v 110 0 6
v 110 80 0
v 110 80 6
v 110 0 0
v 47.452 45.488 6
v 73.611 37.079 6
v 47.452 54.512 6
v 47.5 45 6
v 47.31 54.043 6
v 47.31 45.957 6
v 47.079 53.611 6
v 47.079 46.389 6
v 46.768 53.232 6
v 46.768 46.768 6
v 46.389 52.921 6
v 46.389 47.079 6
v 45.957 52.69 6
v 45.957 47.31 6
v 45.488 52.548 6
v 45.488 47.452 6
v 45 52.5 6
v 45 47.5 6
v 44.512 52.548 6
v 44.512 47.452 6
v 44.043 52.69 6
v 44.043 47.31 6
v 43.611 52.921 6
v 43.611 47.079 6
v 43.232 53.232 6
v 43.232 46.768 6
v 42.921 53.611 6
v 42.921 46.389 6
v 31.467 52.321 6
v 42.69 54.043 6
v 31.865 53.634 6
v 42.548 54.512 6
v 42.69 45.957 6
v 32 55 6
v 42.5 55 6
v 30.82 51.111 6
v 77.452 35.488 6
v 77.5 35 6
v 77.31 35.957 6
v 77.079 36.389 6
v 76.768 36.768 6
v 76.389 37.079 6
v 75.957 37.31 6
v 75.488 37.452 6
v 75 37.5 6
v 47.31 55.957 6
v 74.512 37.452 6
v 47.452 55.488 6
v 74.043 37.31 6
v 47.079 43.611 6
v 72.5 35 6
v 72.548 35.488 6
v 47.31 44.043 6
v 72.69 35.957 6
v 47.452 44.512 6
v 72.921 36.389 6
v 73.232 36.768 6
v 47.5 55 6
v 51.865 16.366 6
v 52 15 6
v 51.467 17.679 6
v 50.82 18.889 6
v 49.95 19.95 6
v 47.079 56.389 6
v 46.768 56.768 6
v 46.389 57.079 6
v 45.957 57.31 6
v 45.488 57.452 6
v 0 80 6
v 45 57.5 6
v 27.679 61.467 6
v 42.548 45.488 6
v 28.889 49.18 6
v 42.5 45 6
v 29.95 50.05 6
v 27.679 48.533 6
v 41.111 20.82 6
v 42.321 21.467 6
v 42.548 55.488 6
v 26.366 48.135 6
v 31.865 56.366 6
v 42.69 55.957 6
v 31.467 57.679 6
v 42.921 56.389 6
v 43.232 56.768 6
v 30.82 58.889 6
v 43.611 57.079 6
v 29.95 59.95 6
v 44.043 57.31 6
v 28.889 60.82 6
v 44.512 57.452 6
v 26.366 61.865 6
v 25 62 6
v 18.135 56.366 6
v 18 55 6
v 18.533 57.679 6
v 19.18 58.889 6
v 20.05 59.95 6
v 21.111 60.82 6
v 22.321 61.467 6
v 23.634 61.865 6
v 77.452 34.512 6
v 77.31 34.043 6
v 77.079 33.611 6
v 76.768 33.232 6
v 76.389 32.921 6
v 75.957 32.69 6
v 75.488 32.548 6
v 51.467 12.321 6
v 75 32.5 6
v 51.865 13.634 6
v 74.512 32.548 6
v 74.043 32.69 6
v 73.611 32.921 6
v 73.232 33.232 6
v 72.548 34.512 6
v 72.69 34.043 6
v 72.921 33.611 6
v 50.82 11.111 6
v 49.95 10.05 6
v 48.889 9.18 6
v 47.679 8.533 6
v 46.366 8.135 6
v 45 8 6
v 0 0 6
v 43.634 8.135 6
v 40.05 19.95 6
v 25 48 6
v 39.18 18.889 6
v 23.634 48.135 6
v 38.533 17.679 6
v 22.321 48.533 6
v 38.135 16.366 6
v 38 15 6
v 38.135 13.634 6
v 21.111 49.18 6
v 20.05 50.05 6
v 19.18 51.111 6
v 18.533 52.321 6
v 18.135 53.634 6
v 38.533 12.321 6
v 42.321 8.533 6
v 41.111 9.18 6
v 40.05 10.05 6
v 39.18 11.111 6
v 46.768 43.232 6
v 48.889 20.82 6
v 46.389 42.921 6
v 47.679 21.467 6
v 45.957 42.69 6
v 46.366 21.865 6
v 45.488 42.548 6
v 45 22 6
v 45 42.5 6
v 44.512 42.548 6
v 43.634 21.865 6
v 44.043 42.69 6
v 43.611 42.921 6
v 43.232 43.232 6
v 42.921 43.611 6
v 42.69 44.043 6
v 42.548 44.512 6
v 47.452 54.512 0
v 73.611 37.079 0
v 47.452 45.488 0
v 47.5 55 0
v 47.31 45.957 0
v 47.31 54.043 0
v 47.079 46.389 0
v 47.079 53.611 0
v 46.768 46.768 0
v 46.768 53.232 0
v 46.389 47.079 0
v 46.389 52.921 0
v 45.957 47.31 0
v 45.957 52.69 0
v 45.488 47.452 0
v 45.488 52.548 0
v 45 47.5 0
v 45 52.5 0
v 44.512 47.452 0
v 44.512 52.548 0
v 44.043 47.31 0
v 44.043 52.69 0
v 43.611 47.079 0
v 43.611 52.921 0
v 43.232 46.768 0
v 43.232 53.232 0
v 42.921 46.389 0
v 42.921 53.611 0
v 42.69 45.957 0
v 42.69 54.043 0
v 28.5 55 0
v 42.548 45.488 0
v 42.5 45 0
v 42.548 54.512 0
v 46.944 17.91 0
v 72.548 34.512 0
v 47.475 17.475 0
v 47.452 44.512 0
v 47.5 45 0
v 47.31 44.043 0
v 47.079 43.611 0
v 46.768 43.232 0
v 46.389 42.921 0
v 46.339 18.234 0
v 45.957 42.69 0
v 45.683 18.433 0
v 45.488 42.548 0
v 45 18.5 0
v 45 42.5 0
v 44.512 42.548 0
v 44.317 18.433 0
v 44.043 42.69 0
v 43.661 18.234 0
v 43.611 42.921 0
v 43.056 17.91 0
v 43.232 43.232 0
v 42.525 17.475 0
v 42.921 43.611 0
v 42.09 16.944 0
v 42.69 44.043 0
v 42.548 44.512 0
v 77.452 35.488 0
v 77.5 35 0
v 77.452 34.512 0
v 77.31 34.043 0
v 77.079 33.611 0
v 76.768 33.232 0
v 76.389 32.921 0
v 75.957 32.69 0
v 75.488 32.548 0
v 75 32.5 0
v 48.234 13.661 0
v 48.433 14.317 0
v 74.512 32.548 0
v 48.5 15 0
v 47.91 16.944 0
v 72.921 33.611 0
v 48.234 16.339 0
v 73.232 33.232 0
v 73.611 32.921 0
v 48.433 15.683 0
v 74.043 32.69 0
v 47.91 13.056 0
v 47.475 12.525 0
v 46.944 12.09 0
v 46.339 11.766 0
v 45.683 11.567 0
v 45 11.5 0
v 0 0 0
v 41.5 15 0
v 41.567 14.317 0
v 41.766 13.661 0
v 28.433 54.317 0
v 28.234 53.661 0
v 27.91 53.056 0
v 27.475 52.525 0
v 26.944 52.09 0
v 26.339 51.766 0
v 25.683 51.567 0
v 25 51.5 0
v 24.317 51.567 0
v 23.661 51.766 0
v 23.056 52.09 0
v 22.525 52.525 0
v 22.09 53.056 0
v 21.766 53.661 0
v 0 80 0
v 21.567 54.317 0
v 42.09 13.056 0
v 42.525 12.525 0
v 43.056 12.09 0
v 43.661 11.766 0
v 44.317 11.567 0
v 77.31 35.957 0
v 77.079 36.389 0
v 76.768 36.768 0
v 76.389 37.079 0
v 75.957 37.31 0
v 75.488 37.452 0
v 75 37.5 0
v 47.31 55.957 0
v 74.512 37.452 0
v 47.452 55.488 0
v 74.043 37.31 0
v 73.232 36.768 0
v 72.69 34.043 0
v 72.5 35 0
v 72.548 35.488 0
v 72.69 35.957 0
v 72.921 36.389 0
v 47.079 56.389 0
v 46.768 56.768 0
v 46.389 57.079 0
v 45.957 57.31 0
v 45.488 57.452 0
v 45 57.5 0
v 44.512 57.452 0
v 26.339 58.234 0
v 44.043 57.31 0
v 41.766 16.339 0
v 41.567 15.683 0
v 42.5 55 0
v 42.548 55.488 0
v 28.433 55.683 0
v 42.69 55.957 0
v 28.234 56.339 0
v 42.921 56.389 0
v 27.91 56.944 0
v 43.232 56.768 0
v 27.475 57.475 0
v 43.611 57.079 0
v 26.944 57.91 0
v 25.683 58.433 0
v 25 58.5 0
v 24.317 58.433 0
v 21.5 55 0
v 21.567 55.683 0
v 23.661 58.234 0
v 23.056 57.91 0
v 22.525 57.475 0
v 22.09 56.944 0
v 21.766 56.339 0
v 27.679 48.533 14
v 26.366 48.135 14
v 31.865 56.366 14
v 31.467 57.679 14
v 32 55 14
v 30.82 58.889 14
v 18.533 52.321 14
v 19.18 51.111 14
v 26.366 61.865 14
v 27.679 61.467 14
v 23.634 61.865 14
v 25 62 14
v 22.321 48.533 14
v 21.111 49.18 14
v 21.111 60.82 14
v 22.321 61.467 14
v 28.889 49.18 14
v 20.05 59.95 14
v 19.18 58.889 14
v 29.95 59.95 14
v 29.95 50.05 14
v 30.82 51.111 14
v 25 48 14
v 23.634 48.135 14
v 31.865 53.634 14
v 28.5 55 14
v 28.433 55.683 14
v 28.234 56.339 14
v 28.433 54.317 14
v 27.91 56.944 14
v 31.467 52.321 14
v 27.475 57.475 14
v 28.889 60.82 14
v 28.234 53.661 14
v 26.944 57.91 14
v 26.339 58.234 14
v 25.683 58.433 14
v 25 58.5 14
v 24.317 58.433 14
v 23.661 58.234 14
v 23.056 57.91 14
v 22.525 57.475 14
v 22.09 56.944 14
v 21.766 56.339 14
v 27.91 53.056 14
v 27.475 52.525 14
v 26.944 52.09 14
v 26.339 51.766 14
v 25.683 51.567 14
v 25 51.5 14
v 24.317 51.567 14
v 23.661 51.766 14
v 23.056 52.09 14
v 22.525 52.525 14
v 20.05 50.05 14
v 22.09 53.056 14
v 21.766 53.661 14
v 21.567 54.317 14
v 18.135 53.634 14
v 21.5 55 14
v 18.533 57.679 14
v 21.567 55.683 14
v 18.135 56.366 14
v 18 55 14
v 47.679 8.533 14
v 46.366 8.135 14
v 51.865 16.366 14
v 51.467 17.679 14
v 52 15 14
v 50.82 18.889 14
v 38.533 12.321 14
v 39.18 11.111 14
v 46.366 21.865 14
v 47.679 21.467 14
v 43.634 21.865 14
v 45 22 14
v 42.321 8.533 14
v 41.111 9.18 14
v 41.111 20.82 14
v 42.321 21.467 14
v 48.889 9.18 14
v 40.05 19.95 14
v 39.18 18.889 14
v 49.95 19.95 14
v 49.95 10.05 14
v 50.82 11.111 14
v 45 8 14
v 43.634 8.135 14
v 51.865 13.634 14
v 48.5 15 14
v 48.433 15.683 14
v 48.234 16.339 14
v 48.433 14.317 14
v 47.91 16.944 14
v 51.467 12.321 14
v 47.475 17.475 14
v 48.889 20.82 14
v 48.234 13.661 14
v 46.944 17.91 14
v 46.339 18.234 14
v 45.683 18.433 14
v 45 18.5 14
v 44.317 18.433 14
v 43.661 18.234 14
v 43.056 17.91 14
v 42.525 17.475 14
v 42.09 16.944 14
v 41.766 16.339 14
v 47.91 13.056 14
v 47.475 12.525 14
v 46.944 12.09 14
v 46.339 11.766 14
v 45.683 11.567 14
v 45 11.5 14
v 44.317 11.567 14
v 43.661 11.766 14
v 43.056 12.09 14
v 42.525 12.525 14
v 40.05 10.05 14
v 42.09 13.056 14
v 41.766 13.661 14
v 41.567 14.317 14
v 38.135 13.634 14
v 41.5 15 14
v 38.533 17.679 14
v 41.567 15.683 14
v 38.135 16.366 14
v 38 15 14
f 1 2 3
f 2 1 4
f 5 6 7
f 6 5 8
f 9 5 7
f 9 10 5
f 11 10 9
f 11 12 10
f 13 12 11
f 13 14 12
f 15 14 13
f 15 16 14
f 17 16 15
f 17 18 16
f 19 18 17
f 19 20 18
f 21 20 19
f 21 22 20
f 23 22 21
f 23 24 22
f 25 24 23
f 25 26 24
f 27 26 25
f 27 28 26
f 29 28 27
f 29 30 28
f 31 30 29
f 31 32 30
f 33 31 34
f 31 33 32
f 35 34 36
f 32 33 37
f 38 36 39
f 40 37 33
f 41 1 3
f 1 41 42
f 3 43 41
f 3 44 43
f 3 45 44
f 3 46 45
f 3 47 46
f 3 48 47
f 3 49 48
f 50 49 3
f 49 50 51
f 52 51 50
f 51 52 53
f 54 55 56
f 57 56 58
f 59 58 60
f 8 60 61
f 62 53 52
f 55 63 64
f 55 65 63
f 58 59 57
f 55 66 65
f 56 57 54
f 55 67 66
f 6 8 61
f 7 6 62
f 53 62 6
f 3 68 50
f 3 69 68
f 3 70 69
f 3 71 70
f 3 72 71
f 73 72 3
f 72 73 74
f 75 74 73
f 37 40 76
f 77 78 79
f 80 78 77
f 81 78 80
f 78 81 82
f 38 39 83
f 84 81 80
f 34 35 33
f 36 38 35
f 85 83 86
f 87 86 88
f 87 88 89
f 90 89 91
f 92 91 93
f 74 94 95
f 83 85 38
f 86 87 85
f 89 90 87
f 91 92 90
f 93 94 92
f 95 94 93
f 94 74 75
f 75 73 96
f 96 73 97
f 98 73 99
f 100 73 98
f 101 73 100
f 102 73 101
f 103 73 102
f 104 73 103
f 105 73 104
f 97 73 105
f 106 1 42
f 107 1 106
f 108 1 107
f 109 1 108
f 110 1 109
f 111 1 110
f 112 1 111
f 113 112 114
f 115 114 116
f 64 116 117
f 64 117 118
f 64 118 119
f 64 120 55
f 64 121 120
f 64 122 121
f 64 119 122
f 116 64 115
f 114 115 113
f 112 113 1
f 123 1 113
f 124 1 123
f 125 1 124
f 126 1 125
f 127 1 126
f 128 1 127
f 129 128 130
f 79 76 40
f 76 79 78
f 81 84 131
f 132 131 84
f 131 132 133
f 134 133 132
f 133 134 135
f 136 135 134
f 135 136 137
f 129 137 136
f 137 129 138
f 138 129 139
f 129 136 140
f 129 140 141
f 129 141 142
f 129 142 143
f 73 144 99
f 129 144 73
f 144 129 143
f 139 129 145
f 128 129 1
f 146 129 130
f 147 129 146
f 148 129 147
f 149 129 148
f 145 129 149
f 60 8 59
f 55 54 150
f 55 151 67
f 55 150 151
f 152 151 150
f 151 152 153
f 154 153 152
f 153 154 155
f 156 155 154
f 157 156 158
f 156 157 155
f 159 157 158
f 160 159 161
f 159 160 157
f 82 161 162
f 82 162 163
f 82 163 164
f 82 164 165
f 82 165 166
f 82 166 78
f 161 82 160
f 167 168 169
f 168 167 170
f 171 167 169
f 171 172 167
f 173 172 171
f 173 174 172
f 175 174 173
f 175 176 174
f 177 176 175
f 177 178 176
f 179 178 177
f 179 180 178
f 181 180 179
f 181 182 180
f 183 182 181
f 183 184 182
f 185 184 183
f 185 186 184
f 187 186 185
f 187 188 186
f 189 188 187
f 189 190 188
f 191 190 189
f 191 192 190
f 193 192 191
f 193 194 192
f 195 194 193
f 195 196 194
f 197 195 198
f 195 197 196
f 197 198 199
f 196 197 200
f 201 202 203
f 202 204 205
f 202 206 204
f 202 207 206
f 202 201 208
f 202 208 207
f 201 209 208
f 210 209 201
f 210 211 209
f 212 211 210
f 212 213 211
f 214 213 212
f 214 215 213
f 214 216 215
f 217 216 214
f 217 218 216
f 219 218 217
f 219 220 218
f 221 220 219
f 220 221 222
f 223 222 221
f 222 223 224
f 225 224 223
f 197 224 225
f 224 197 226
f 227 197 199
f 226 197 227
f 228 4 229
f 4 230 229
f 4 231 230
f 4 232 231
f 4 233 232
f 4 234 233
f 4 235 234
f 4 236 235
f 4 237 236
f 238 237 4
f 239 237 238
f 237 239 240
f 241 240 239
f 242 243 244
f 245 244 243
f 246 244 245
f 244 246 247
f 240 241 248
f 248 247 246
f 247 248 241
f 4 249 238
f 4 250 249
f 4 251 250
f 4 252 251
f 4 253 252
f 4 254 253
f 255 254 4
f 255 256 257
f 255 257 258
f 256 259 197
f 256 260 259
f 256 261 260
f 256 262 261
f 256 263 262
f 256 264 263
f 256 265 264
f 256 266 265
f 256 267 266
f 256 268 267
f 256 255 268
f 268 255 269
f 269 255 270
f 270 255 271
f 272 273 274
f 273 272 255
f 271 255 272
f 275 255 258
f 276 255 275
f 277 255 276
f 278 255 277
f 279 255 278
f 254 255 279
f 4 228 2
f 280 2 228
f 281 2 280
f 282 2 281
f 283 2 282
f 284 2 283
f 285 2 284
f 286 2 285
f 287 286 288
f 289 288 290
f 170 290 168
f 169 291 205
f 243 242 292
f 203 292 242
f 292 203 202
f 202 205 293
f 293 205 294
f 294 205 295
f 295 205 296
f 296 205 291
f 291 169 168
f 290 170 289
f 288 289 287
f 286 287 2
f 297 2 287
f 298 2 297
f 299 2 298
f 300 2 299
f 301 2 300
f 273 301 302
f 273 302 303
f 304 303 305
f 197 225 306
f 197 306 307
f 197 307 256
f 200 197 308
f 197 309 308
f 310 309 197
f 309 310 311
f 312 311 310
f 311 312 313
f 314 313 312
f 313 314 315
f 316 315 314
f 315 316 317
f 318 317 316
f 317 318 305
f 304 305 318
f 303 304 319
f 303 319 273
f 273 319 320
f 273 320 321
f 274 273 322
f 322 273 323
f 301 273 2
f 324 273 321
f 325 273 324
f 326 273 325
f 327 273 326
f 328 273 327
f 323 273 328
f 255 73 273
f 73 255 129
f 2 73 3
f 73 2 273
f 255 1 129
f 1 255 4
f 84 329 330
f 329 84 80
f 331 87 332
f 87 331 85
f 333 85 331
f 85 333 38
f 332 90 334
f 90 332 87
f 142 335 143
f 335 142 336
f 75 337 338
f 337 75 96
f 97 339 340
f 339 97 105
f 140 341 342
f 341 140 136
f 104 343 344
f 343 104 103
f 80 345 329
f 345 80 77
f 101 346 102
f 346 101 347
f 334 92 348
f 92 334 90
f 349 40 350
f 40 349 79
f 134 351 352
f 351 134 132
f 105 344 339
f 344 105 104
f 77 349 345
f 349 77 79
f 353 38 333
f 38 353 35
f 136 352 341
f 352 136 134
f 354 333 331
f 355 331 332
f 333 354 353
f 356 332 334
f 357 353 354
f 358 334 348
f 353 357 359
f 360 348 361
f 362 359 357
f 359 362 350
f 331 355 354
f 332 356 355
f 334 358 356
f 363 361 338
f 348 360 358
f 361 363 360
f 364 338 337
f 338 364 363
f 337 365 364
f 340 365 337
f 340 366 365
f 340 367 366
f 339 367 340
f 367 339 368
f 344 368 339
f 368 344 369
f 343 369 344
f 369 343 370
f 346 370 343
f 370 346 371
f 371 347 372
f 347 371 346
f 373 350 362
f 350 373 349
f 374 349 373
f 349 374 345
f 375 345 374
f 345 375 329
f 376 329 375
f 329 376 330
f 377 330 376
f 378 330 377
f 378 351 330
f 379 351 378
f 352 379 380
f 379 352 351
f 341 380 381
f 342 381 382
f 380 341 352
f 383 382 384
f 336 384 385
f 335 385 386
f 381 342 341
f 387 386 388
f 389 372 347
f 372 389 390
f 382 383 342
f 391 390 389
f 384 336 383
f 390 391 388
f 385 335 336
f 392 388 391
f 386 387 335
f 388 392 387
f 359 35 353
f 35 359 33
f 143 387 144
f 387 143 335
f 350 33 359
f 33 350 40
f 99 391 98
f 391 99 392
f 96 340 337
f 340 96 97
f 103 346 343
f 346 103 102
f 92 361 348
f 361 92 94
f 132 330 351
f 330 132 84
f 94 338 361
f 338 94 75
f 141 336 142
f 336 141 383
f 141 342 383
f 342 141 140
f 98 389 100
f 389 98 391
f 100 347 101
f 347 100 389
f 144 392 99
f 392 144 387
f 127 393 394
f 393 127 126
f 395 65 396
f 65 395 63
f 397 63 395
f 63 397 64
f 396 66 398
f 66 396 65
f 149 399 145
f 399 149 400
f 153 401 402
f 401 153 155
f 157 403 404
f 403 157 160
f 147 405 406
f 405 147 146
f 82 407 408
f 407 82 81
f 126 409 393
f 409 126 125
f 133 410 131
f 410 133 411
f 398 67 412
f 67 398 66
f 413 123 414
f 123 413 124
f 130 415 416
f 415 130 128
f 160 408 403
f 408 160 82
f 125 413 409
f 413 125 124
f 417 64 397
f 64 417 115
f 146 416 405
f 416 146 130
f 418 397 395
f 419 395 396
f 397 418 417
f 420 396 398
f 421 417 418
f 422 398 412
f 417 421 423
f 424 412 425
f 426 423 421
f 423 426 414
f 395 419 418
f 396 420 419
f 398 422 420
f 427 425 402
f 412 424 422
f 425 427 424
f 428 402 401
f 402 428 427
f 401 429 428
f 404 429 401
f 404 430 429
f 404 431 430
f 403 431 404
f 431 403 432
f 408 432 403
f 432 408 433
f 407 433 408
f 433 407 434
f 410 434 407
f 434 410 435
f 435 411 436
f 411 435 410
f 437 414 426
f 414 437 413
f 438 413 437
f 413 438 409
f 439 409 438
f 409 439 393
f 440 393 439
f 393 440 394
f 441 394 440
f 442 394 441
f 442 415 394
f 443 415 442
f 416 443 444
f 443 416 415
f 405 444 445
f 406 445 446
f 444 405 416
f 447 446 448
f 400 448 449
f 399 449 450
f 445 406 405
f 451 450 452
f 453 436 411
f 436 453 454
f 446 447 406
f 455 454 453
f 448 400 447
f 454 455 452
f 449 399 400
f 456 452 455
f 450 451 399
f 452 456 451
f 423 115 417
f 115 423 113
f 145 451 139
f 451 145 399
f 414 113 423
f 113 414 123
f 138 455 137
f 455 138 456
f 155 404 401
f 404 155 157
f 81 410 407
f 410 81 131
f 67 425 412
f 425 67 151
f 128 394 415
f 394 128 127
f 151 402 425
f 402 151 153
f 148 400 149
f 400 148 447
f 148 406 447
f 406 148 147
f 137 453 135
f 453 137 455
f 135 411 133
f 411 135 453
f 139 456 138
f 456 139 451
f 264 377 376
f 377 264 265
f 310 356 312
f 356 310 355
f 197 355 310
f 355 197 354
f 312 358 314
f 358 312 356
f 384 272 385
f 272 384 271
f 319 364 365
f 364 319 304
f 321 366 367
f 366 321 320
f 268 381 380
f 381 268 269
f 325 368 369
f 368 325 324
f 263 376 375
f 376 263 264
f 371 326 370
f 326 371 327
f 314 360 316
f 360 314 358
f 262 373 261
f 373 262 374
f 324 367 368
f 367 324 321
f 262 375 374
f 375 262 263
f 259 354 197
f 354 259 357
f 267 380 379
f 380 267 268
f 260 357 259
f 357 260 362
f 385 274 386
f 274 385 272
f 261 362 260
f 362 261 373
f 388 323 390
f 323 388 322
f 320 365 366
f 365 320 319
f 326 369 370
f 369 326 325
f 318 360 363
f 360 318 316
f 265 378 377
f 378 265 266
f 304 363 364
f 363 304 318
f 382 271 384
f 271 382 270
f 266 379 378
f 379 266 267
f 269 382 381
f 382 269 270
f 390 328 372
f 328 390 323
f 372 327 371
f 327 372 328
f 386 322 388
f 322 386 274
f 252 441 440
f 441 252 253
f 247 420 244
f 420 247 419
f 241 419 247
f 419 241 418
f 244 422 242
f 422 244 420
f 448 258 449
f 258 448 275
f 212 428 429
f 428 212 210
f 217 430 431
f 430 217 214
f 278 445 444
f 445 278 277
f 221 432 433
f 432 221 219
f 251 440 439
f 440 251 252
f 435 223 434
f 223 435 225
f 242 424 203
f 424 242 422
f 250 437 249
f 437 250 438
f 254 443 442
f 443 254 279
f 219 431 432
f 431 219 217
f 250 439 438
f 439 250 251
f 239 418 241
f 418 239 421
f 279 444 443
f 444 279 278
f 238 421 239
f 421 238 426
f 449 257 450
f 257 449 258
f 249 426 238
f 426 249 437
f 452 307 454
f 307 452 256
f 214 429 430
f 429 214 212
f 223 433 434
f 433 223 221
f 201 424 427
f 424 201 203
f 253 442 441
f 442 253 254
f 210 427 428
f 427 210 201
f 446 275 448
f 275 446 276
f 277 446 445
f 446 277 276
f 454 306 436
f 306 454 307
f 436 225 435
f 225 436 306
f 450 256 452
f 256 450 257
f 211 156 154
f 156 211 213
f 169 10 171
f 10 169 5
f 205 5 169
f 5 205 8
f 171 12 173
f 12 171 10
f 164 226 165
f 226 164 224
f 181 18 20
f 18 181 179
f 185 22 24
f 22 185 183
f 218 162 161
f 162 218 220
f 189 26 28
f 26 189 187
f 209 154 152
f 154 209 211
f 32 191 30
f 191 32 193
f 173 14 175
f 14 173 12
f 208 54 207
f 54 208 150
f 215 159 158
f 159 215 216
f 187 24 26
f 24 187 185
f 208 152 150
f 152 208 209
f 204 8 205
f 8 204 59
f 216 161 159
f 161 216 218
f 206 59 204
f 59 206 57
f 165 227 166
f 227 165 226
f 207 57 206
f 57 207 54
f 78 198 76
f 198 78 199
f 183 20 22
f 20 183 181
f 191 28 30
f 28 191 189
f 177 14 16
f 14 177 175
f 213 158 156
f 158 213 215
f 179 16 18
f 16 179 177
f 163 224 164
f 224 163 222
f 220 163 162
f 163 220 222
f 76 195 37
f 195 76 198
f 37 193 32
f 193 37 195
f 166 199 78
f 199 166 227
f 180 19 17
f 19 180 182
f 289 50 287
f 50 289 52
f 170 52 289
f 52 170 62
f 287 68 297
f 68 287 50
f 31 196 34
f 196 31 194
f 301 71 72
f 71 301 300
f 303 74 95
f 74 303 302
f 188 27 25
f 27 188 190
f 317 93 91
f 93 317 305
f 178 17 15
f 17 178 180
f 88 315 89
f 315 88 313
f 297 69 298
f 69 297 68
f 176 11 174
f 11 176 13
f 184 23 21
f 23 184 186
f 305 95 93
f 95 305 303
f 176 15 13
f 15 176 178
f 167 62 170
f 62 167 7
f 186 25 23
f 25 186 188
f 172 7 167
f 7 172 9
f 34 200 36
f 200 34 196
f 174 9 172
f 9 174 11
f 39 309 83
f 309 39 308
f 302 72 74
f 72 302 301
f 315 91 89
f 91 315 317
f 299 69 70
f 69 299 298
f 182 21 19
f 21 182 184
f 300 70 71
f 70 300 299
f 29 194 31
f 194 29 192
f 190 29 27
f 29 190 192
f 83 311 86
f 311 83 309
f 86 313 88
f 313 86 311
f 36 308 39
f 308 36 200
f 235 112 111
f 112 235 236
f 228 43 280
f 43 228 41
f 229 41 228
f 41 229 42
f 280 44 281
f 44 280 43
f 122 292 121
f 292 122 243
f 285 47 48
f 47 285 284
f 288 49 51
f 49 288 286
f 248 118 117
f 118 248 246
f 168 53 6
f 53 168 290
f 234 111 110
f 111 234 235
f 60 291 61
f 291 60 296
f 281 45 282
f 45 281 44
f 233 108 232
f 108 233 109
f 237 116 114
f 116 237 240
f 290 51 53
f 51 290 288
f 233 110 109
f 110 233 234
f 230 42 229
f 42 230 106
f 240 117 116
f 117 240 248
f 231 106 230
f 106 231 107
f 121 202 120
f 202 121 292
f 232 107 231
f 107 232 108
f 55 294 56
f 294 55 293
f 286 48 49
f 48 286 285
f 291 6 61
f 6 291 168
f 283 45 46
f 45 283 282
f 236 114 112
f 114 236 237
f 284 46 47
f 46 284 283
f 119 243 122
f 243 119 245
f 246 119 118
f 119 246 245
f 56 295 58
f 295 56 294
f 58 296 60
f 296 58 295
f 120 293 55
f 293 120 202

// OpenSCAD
$fn = 32;

// ----------------------------------------------------------------------
// Mixed field: bosses and holes at given coordinates
// ----------------------------------------------------------------------

// --- parameters (mm) ---
plate_l = 110;            // plate length, X
plate_w = 80;             // plate width, Y
plate_t = 6;              // plate thickness, Z
boss_d = 14;              // boss diameter
boss_h = 8;               // boss height above the plate
hole_d = 5;               // through hole diameter

total_h = plate_t + boss_h;  // overall height

difference() {
  union() {
    cube([plate_l, plate_w, plate_t]);
    translate([25, 55, plate_t]) cylinder(h = boss_h, d = boss_d);
    translate([45, 15, plate_t]) cylinder(h = boss_h, d = boss_d);
  }
  translate([25, 55, -1]) cylinder(h = total_h + 2, d = boss_d / 2);
  translate([45, 15, -1]) cylinder(h = total_h + 2, d = boss_d / 2);
  translate([45, 45, -1]) cylinder(h = plate_t + 2, d = hole_d);
  translate([45, 55, -1]) cylinder(h = plate_t + 2, d = hole_d);
  translate([75, 35, -1]) cylinder(h = plate_t + 2, d = hole_d);
}
